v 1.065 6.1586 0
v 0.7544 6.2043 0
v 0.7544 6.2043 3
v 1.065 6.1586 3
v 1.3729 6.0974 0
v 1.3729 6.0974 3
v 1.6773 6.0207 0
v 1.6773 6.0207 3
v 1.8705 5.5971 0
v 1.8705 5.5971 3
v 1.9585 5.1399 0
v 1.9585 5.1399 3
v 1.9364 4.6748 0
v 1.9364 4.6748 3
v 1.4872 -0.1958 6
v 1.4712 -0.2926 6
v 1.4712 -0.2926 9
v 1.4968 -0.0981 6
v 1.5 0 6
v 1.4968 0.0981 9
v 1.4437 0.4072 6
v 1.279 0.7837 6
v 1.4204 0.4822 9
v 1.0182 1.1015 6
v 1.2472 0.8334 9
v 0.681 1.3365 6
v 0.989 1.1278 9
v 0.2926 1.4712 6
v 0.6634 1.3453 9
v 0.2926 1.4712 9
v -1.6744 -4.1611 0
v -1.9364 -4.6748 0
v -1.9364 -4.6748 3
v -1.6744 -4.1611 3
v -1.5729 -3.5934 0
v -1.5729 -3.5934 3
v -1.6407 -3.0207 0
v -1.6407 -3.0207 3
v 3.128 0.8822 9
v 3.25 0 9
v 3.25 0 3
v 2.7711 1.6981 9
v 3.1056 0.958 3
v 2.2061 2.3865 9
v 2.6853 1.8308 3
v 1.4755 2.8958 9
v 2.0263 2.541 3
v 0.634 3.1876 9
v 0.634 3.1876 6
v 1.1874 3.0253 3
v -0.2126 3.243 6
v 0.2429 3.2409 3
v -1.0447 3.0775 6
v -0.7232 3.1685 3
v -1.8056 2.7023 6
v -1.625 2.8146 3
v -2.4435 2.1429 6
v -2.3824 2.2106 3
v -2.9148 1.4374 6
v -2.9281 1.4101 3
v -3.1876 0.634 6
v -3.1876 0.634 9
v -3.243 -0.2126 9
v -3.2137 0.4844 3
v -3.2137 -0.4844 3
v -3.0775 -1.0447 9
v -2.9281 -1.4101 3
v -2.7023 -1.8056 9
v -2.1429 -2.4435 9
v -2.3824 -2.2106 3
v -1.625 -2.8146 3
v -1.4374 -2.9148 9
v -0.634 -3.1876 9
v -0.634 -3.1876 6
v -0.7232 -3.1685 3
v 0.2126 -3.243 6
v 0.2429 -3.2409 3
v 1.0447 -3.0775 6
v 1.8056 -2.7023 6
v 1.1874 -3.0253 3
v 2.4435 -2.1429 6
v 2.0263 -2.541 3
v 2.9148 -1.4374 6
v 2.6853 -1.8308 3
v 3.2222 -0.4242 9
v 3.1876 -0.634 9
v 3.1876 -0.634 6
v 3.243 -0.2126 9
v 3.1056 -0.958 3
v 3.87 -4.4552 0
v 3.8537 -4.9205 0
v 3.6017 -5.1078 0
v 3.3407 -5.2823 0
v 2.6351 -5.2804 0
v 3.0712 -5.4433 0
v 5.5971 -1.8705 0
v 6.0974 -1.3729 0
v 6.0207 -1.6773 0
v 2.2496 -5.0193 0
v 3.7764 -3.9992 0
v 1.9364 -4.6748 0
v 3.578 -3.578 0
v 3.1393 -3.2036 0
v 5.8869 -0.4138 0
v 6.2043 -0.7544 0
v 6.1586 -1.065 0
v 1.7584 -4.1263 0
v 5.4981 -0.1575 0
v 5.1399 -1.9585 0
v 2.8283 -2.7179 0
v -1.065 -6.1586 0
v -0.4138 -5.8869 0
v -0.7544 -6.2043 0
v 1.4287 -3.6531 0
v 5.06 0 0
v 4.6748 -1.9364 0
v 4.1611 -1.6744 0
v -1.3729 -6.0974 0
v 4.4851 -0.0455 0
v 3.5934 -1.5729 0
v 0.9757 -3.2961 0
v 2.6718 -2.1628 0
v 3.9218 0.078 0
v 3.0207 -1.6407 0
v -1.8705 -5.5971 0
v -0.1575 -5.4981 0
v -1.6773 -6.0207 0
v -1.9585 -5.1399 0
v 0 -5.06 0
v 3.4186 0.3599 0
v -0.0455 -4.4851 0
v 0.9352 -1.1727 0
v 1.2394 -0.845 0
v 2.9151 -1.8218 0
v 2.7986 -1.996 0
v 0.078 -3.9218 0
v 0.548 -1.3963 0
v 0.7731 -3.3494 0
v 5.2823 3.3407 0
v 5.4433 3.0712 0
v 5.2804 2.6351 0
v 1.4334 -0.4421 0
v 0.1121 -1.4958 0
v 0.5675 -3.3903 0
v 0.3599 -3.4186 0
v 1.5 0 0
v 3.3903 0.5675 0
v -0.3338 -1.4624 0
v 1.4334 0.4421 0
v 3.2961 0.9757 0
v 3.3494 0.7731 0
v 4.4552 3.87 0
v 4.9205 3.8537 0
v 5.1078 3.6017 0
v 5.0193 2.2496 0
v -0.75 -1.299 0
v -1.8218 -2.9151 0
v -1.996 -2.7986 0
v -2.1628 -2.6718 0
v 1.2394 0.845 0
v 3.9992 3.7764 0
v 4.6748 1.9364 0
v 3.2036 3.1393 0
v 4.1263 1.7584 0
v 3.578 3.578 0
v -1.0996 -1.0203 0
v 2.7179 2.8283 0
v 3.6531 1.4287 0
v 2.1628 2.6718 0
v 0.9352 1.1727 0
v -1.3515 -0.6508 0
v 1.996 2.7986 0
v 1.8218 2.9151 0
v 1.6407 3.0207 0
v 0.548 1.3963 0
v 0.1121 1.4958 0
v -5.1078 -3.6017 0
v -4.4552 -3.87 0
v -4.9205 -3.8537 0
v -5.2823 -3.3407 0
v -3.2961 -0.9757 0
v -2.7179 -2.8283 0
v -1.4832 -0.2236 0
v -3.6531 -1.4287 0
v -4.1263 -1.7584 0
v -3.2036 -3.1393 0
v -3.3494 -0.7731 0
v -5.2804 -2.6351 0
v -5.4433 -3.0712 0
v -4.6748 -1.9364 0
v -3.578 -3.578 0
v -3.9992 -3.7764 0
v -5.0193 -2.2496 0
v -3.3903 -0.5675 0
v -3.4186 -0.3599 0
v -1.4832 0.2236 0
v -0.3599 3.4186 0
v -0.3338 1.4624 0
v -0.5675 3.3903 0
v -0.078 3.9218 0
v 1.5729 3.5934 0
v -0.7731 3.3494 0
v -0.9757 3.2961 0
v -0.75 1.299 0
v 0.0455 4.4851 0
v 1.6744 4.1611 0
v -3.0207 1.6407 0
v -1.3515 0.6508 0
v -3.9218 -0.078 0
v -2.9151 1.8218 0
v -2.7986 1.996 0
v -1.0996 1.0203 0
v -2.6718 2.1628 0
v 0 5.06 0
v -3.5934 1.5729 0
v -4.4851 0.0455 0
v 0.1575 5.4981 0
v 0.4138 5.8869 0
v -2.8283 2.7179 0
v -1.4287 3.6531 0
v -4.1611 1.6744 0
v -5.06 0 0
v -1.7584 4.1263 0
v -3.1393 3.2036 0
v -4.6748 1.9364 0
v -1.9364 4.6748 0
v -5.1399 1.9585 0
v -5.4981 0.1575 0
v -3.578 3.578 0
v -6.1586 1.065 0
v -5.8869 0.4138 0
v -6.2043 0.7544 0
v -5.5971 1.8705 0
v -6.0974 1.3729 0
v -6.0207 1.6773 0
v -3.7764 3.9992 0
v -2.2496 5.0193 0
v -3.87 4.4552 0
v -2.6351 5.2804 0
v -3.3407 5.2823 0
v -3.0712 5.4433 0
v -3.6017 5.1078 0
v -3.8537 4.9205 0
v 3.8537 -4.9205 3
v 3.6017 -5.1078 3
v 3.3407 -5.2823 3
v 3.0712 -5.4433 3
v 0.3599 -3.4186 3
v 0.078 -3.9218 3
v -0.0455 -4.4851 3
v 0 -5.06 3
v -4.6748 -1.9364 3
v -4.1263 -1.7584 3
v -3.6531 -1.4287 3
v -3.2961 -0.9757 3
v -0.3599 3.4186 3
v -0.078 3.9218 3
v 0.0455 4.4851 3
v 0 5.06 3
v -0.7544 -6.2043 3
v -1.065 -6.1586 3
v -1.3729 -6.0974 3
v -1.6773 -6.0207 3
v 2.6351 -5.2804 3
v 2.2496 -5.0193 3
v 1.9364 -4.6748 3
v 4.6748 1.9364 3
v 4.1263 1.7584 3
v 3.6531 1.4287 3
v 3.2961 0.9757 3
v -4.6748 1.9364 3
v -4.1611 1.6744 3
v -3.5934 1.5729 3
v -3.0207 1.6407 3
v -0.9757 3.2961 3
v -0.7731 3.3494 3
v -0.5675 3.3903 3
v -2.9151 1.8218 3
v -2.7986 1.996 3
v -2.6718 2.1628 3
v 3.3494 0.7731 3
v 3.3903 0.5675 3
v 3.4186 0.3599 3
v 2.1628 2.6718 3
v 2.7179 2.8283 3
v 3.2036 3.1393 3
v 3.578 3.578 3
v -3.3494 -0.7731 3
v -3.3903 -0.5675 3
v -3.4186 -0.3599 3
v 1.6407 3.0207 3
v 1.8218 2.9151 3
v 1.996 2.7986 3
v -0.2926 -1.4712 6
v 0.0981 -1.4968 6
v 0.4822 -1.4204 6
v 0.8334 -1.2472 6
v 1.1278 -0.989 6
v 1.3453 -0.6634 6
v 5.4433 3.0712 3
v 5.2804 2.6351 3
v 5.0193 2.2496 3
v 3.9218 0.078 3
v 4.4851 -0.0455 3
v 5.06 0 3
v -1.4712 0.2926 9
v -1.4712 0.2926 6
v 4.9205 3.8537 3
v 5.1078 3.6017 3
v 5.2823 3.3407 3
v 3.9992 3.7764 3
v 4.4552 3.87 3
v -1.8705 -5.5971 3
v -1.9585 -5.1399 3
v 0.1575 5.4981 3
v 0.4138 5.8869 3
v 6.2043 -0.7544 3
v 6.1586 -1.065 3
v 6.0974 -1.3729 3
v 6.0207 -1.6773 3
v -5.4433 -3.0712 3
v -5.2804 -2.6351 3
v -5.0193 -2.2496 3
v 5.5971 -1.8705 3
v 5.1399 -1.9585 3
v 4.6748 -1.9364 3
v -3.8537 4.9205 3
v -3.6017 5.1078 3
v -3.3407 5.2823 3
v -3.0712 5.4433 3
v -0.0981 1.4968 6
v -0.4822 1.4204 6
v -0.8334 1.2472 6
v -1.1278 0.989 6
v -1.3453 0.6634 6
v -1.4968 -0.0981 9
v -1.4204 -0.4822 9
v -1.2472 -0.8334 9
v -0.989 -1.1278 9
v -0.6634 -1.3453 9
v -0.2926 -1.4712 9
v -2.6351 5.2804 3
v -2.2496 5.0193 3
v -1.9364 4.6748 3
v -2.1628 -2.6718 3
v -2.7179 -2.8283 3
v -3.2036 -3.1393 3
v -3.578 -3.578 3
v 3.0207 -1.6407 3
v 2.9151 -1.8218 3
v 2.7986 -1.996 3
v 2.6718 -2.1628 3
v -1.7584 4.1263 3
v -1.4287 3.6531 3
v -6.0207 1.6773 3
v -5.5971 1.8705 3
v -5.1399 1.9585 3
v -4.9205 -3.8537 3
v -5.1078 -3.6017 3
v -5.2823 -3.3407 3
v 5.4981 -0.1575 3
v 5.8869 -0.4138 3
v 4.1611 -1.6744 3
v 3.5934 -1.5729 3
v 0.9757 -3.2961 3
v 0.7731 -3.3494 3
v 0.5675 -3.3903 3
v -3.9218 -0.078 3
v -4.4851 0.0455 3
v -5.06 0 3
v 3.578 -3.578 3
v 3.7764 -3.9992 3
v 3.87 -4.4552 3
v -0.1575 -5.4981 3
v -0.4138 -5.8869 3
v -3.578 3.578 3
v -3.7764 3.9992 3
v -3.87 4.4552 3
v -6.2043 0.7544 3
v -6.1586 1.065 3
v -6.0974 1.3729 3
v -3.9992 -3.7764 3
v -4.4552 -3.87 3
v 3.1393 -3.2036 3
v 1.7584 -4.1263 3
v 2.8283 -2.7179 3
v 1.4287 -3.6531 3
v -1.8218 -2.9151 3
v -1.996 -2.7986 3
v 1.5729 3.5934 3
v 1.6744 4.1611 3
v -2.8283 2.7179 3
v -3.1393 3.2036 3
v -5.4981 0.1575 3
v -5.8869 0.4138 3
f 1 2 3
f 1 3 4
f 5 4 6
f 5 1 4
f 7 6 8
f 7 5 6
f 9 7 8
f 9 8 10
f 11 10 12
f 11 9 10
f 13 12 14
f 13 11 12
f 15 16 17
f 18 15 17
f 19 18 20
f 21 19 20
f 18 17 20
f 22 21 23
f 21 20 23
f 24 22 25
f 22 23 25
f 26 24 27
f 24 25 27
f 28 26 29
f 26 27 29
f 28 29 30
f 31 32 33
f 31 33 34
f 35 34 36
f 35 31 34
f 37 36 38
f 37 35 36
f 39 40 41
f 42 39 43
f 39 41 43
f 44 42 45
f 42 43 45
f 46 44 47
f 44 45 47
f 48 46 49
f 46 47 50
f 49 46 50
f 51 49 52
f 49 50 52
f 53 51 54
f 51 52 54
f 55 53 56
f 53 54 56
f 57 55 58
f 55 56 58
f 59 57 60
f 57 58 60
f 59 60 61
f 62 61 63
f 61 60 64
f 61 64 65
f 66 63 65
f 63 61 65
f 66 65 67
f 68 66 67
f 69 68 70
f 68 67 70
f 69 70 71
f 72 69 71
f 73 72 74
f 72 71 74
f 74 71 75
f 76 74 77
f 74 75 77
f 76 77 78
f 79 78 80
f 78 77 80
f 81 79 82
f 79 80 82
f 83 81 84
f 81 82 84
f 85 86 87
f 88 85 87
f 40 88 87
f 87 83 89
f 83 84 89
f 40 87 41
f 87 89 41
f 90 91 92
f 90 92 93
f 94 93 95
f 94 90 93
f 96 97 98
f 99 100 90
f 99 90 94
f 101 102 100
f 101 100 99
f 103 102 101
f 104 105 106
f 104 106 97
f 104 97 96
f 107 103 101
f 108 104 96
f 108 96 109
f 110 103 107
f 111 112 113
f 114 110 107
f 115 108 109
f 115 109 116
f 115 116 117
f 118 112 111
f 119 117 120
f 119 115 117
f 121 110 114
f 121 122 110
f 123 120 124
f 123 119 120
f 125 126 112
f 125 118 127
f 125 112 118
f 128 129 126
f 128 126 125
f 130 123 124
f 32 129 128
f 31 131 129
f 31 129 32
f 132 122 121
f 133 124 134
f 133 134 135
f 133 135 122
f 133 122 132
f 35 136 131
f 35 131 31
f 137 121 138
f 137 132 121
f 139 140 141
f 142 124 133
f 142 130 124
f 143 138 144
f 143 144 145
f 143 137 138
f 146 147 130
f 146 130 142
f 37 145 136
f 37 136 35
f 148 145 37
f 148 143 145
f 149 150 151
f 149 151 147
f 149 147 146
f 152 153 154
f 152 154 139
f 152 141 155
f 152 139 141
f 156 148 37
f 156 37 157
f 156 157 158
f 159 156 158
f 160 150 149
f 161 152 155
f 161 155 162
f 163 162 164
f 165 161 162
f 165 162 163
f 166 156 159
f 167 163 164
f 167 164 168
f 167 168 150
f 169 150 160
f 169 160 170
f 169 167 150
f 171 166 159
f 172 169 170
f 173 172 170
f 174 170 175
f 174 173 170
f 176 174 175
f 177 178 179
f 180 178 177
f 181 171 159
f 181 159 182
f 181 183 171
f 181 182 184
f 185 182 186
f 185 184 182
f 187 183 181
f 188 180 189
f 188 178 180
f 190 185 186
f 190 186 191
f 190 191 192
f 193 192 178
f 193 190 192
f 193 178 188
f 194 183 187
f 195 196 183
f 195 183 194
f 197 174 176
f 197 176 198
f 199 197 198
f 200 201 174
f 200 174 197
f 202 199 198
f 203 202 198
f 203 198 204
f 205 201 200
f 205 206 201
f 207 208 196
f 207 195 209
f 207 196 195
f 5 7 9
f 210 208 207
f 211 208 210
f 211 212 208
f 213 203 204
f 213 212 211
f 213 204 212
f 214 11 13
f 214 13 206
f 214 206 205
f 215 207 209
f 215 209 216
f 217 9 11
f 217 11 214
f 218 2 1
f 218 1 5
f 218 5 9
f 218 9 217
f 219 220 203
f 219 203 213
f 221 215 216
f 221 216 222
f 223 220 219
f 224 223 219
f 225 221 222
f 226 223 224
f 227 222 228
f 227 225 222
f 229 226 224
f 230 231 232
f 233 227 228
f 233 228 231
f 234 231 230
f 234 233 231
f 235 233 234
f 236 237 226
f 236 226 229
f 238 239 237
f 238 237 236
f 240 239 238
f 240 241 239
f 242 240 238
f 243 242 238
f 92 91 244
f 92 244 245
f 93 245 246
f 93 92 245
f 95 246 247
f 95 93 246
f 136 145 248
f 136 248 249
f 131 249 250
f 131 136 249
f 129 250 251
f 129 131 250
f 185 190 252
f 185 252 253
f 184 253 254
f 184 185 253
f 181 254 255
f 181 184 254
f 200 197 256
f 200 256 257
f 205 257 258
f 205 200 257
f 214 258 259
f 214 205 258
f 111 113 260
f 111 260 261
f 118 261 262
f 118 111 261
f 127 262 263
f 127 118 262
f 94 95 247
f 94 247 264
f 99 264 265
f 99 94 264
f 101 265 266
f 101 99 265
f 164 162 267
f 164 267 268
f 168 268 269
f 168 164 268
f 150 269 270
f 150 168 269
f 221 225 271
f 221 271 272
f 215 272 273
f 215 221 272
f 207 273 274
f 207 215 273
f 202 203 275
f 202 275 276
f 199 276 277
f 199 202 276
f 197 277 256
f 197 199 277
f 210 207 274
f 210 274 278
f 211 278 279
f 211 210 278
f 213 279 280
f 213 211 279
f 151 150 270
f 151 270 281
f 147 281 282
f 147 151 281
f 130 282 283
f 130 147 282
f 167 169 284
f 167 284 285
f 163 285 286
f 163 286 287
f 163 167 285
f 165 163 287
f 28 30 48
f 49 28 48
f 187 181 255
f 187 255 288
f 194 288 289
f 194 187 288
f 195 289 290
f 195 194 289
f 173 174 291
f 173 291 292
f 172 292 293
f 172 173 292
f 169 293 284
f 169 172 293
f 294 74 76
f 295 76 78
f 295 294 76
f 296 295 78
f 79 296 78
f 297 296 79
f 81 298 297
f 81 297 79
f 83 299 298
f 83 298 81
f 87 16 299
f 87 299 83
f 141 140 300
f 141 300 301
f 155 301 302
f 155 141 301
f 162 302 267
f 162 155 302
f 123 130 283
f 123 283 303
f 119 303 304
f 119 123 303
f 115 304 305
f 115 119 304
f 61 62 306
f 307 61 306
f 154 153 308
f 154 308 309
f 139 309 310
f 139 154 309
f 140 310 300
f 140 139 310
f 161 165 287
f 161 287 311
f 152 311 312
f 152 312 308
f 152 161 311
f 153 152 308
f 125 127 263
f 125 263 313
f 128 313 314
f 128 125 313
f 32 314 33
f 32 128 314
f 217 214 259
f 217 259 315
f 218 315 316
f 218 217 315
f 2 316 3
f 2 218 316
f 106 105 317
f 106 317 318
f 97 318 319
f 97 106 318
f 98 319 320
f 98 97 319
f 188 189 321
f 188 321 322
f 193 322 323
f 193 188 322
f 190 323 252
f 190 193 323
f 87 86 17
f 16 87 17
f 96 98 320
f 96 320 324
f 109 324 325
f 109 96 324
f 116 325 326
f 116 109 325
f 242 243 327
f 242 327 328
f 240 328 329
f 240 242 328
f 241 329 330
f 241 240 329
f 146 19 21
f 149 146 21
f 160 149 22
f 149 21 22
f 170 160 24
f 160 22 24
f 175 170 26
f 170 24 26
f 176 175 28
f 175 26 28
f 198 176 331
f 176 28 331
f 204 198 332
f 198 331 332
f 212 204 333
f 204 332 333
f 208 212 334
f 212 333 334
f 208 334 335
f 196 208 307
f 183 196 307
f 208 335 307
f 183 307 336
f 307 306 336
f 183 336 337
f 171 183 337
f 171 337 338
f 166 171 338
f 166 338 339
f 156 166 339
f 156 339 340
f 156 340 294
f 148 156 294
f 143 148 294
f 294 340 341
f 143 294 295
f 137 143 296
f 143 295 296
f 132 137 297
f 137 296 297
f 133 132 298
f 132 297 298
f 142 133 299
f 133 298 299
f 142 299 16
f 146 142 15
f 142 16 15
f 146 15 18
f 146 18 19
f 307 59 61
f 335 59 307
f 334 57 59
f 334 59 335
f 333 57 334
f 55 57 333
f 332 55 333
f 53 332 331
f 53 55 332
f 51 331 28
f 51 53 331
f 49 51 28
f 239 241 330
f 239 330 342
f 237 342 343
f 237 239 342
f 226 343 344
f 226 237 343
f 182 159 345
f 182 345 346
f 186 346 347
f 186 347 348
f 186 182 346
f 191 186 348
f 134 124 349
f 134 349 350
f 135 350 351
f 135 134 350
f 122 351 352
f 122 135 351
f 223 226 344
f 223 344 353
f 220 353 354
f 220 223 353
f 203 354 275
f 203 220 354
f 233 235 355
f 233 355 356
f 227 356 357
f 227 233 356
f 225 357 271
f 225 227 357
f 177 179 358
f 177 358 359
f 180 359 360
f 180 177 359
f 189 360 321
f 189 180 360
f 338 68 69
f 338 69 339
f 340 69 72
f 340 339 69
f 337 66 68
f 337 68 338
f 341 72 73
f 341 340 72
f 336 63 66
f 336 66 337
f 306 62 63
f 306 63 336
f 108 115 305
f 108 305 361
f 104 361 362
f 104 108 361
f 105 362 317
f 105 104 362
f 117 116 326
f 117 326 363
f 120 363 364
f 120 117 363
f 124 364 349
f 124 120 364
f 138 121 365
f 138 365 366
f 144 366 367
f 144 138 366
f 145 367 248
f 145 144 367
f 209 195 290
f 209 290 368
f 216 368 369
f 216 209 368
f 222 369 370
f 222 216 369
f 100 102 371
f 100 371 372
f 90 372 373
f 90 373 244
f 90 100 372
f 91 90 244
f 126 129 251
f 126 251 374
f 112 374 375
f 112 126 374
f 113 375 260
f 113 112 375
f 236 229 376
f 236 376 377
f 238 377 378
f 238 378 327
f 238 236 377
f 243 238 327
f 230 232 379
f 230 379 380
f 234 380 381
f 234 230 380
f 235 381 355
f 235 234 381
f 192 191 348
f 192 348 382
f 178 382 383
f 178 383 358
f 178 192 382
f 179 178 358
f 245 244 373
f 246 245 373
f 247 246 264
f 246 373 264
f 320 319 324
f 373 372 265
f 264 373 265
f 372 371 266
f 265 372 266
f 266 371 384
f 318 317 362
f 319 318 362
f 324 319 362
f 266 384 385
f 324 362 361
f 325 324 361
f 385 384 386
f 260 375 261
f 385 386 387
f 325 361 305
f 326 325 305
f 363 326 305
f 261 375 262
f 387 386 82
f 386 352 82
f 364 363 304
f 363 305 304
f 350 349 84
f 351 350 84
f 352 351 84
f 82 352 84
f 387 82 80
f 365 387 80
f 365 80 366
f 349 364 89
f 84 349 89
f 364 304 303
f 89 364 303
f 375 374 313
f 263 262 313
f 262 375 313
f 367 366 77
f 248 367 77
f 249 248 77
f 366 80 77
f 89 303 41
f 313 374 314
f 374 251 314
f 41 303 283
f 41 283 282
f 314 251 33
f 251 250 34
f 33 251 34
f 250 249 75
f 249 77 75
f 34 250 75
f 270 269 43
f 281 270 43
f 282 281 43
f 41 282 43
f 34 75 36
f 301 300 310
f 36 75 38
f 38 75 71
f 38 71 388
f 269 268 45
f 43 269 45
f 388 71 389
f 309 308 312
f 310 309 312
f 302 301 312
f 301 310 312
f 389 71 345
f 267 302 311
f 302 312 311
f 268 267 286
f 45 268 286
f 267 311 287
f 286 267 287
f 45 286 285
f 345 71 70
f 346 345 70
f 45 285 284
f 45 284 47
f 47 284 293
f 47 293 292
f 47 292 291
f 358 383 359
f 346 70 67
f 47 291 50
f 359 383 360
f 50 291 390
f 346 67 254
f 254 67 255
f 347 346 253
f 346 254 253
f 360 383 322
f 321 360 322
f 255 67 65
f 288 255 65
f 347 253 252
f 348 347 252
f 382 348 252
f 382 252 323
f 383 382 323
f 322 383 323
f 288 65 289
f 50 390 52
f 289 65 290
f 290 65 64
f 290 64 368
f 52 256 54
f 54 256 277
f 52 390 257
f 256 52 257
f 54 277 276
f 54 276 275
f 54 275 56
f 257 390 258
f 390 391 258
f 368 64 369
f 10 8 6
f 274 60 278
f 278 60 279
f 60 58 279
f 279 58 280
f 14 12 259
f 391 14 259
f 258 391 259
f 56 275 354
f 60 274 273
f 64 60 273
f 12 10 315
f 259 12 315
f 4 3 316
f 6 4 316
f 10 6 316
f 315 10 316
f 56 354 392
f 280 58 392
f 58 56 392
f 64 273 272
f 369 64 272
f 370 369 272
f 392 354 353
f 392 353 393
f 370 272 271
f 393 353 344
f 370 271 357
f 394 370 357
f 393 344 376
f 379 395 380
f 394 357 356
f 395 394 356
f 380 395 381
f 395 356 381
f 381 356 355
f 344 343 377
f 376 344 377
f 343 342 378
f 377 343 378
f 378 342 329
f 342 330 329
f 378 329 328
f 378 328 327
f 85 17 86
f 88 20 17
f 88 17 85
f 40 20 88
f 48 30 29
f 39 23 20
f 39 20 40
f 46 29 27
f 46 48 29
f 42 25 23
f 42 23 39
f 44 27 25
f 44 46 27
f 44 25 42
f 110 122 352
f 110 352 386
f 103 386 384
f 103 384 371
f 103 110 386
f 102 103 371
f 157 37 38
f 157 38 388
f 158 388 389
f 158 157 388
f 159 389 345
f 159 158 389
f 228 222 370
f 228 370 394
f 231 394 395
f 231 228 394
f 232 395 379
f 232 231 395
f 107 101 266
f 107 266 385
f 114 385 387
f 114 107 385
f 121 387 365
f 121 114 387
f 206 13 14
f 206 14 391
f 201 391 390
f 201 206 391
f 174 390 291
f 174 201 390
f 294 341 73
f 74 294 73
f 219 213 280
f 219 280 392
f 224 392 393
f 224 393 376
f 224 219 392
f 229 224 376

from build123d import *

# Parameters (mm, degrees)
SALIENTE_EXTRUIR1_DEPTH = 3
CROQUIS2_R              = 3.25
SALIENTE_EXTRUIR2_DEPTH = 3
CROQUIS3_R              = 3.25
SALIENTE_EXTRUIR3_DEPTH = 3
CORTAR_EXTRUIR2_DEPTH   = 3
CROQUIS6_R              = 1.5
CORTAR_EXTRUIR3_DEPTH   = 10


with BuildPart() as part:
    # Croquis1 → Saliente-Extruir1 (new body)
    with BuildSketch(Plane.XY):
        with BuildLine():
            ThreePointArc((3.41860772, 0.359899305), (4.198868033, -0.004516375), (5.060021066, 0))
            ThreePointArc((5.060021066, 0), (5.700122231, -0.2741037), (6.204306422, -0.754375124))
            ThreePointArc((6.204306422, -0.754375124), (6.129908003, -1.219314513), (6.020718578, -1.67733354))
            ThreePointArc((6.020718578, -1.67733354), (5.371121207, -1.928103542), (4.674849897, -1.93638623))
            ThreePointArc((4.674849897, -1.93638623), (3.880976577, -1.602664645), (3.020654201, -1.640748138))
            ThreePointArc((3.020654201, -1.640748138), (2.858176792, -1.909772676), (2.67180794, -2.162833462))
            ThreePointArc((2.67180794, -2.162833462), (2.9658545, -2.972241619), (3.577975209, -3.577975209))
            ThreePointArc((3.577975209, -3.577975209), (3.836774498, -4.224415668), (3.853683377, -4.920530909))
            ThreePointArc((3.853683377, -4.920530909), (3.472313956, -5.196685077), (3.071237014, -5.443344854))
            ThreePointArc((3.071237014, -5.443344854), (2.434581138, -5.161331317), (1.93638623, -4.674849897))
            ThreePointArc((1.93638623, -4.674849897), (1.611009817, -3.877519894), (0.975740935, -3.296109203))
            ThreePointArc((0.975740935, -3.296109203), (0.670622982, -3.371449401), (0.359899305, -3.41860772))
            ThreePointArc((0.359899305, -3.41860772), (-0.004516375, -4.198868033), (0, -5.060021066))
            ThreePointArc((0, -5.060021066), (-0.2741037, -5.700122231), (-0.754375124, -6.204306422))
            ThreePointArc((-0.754375124, -6.204306422), (-1.219314513, -6.129908003), (-1.67733354, -6.020718578))
            ThreePointArc((-1.67733354, -6.020718578), (-1.928103542, -5.371121207), (-1.93638623, -4.674849897))
            ThreePointArc((-1.93638623, -4.674849897), (-1.602664645, -3.880976577), (-1.640748138, -3.020654201))
            ThreePointArc((-1.640748138, -3.020654201), (-1.909772676, -2.858176792), (-2.162833462, -2.67180794))
            ThreePointArc((-2.162833462, -2.67180794), (-2.972241619, -2.9658545), (-3.577975209, -3.577975209))
            ThreePointArc((-3.577975209, -3.577975209), (-4.224415668, -3.836774498), (-4.920530909, -3.853683377))
            ThreePointArc((-4.920530909, -3.853683377), (-5.196685077, -3.472313956), (-5.443344854, -3.071237014))
            ThreePointArc((-5.443344854, -3.071237014), (-5.161331317, -2.434581138), (-4.674849897, -1.93638623))
            ThreePointArc((-4.674849897, -1.93638623), (-3.877519894, -1.611009817), (-3.296109203, -0.975740935))
            ThreePointArc((-3.296109203, -0.975740935), (-3.371449401, -0.670622982), (-3.41860772, -0.359899305))
            ThreePointArc((-3.41860772, -0.359899305), (-4.198868033, 0.004516375), (-5.060021066, 0))
            ThreePointArc((-5.060021066, 0), (-5.700122231, 0.2741037), (-6.204306422, 0.754375124))
            ThreePointArc((-6.204306422, 0.754375124), (-6.129908003, 1.219314513), (-6.020718578, 1.67733354))
            ThreePointArc((-6.020718578, 1.67733354), (-5.371121207, 1.928103542), (-4.674849897, 1.93638623))
            ThreePointArc((-4.674849897, 1.93638623), (-3.880976577, 1.602664645), (-3.020654201, 1.640748138))
            ThreePointArc((-3.020654201, 1.640748138), (-2.858176792, 1.909772676), (-2.67180794, 2.162833462))
            ThreePointArc((-2.67180794, 2.162833462), (-2.9658545, 2.972241619), (-3.577975209, 3.577975209))
            ThreePointArc((-3.577975209, 3.577975209), (-3.836774498, 4.224415668), (-3.853683377, 4.920530909))
            ThreePointArc((-3.853683377, 4.920530909), (-3.472313956, 5.196685077), (-3.071237014, 5.443344854))
            ThreePointArc((-3.071237014, 5.443344854), (-2.434581138, 5.161331317), (-1.93638623, 4.674849897))
            ThreePointArc((-1.93638623, 4.674849897), (-1.611009817, 3.877519894), (-0.975740935, 3.296109203))
            ThreePointArc((-0.975740935, 3.296109203), (-0.670622982, 3.371449401), (-0.359899305, 3.41860772))
            ThreePointArc((-0.359899305, 3.41860772), (0.004516375, 4.198868033), (0, 5.060021066))
            ThreePointArc((0, 5.060021066), (0.2741037, 5.700122231), (0.754375124, 6.204306422))
            ThreePointArc((0.754375124, 6.204306422), (1.219314513, 6.129908003), (1.67733354, 6.020718578))
            ThreePointArc((1.67733354, 6.020718578), (1.928103542, 5.371121207), (1.93638623, 4.674849897))
            ThreePointArc((1.93638623, 4.674849897), (1.602664645, 3.880976577), (1.640748138, 3.020654201))
            ThreePointArc((1.640748138, 3.020654201), (1.909772676, 2.858176792), (2.162833462, 2.67180794))
            ThreePointArc((2.162833462, 2.67180794), (2.972241619, 2.9658545), (3.577975209, 3.577975209))
            ThreePointArc((3.577975209, 3.577975209), (4.224415668, 3.836774498), (4.920530909, 3.853683377))
            ThreePointArc((4.920530909, 3.853683377), (5.196685077, 3.472313956), (5.443344854, 3.071237014))
            ThreePointArc((5.443344854, 3.071237014), (5.161331317, 2.434581138), (4.674849897, 1.93638623))
            ThreePointArc((4.674849897, 1.93638623), (3.877519894, 1.611009817), (3.296109203, 0.975740935))
            ThreePointArc((3.296109203, 0.975740935), (3.371449401, 0.670622982), (3.41860772, 0.359899305))
        make_face()
    extrude(amount=SALIENTE_EXTRUIR1_DEPTH)

    # Croquis2 → Saliente-Extruir2 (add)
    with BuildSketch(Plane.XY.offset(3)):
        Circle(CROQUIS2_R)
    extrude(amount=SALIENTE_EXTRUIR2_DEPTH)

    # Croquis3 → Saliente-Extruir3 (add)
    with BuildSketch(Plane.XY.offset(6)):
        Circle(CROQUIS3_R)
    extrude(amount=SALIENTE_EXTRUIR3_DEPTH)

    # Croquis4 → Cortar-Extruir2 (cut)
    with BuildSketch(Plane.XY.offset(9)):
        with BuildLine():
            Line((0.292635483, 1.471177921), (1.219314513, 6.129908003))
            Line((1.219314513, 6.129908003), (-6.129908003, 1.219314513))
            Line((-6.129908003, 1.219314513), (-1.471177921, 0.292635483))
            ThreePointArc((-1.471177921, 0.292635483), (-1.247204418, -0.83335535), (-0.292635483, -1.471177921))
            Line((-0.292635483, -1.471177921), (-1.219314513, -6.129908003))
            Line((-1.219314513, -6.129908003), (6.129908003, -1.219314513))
            Line((6.129908003, -1.219314513), (1.471177921, -0.292635483))
            ThreePointArc((1.471177921, -0.292635483), (1.247204418, 0.83335535), (0.292635483, 1.471177921))
        make_face()
    extrude(amount=-CORTAR_EXTRUIR2_DEPTH, mode=Mode.SUBTRACT)

    # Croquis6 → Cortar-Extruir3 (cut)
    with BuildSketch(Plane.XY.offset(6)):
        Circle(CROQUIS6_R)
    extrude(amount=-CORTAR_EXTRUIR3_DEPTH, mode=Mode.SUBTRACT)


solid = part.part
